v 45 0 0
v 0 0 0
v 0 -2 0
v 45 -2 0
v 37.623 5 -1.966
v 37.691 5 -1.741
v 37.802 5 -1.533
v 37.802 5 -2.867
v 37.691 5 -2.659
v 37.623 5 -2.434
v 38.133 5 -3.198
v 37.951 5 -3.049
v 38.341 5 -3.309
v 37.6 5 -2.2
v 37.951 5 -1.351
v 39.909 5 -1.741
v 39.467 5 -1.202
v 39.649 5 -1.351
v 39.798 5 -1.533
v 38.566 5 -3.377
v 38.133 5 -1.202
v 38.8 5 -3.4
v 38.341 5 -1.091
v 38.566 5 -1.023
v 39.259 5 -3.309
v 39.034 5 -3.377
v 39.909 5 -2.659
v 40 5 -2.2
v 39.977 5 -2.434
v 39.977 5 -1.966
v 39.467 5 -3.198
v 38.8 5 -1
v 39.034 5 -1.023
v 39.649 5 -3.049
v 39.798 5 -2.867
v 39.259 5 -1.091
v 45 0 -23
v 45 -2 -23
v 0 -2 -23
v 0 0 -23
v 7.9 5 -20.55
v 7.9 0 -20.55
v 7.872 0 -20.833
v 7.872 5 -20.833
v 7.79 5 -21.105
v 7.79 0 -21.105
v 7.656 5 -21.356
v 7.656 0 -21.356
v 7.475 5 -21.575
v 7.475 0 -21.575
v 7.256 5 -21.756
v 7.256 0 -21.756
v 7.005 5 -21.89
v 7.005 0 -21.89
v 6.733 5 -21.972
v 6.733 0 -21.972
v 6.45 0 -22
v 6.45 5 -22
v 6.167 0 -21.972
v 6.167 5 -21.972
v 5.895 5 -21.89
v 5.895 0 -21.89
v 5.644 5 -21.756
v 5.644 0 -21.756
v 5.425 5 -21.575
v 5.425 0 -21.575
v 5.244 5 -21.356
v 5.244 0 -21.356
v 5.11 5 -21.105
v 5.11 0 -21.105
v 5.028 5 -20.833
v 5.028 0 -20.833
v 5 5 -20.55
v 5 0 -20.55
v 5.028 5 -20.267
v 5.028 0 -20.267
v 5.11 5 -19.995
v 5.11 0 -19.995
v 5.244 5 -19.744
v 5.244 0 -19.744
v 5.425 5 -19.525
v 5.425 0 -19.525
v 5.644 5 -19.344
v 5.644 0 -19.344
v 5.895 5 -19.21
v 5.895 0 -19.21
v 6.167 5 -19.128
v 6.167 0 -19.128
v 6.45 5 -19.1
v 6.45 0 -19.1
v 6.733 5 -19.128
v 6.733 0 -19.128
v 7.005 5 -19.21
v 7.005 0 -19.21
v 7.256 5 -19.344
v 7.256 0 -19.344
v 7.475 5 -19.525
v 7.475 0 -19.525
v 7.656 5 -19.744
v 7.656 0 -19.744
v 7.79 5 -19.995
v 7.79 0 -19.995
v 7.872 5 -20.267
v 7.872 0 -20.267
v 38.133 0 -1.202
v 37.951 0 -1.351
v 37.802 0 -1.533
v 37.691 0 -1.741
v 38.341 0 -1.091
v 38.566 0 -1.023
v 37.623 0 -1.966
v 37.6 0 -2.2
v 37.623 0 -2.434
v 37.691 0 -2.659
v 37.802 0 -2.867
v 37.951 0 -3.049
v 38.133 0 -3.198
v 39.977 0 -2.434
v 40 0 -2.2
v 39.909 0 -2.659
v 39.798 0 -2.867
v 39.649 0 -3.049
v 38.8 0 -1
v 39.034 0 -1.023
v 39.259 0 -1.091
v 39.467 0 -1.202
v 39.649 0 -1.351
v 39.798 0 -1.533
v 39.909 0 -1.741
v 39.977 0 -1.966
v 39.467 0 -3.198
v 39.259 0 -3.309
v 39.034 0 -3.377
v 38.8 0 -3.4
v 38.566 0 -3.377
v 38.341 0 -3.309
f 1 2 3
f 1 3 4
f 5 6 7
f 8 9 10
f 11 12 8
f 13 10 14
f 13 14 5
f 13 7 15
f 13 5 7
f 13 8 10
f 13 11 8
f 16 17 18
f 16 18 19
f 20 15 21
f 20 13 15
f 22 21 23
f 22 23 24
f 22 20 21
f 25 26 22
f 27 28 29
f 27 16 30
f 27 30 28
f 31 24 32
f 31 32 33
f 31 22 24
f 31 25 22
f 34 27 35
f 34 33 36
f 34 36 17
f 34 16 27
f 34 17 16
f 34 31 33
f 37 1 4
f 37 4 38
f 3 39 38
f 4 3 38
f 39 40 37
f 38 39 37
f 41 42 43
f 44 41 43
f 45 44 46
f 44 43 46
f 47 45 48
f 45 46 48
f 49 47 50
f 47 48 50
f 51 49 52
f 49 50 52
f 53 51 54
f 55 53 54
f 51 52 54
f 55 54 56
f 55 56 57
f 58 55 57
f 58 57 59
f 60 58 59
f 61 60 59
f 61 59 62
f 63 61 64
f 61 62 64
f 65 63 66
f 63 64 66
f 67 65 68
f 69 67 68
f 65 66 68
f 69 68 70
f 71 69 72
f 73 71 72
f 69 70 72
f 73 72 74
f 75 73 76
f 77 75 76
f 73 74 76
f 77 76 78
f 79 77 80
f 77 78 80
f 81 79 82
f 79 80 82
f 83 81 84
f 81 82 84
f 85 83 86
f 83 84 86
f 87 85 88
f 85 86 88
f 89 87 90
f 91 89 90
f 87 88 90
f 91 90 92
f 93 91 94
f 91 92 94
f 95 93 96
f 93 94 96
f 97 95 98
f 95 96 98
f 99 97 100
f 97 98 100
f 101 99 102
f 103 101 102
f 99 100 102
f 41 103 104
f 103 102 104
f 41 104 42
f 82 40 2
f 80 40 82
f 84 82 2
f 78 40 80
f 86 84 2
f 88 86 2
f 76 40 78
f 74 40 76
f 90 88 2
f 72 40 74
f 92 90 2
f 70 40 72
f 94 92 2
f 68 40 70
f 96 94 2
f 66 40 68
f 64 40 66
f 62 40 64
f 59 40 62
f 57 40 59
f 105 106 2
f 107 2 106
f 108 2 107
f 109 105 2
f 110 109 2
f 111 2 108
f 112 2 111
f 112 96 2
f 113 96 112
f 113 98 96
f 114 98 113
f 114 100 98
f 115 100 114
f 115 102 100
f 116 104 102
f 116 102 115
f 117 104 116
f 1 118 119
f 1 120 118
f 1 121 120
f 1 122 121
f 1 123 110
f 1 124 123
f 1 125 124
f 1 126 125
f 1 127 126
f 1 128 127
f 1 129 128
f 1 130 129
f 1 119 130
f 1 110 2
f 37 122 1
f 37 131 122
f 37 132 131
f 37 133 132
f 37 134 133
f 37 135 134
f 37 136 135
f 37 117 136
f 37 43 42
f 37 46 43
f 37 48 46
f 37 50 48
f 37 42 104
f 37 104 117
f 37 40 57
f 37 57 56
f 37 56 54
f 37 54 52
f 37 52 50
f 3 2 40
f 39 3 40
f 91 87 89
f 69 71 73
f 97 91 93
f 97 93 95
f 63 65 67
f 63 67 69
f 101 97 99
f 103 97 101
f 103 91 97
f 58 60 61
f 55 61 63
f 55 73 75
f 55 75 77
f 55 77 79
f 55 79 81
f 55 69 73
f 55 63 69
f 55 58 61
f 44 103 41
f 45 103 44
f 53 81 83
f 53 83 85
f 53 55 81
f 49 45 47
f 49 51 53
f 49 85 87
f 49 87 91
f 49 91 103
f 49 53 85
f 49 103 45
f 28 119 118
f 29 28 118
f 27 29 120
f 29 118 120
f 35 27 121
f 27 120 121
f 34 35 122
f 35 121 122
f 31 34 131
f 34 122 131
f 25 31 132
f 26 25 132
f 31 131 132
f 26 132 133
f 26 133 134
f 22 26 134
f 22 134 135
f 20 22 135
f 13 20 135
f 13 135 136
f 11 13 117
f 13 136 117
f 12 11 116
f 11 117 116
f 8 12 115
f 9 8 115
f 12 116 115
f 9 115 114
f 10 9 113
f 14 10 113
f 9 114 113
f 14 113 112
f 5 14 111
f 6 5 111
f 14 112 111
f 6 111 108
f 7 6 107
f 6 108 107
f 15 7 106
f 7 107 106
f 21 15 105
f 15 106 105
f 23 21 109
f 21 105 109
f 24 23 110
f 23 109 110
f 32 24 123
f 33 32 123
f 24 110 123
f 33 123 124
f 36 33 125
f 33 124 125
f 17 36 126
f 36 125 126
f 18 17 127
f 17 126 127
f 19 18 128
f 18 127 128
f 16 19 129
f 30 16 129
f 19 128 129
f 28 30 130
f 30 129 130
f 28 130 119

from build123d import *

# Parameters (mm, degrees)
SKETCH1_W           = 45
SKETCH1_H           = 23
BOSS_EXTRUDE1_DEPTH = 2
SKETCH2_R           = 1.1999976
BOSS_EXTRUDE2_DEPTH = 5
SKETCH3_R           = 1.45
BOSS_EXTRUDE3_DEPTH = 5


with BuildPart() as part:
    # Sketch1 → Boss-Extrude1 (new body)
    with BuildSketch(Plane(origin=(0, 0, 0), x_dir=(1, 0, 0), z_dir=(0, 1, 0))):
        with Locations((22.5, 11.5)):
            Rectangle(SKETCH1_W, SKETCH1_H)
    extrude(amount=-BOSS_EXTRUDE1_DEPTH)

    # Sketch2 → Boss-Extrude2 (add)
    with BuildSketch(Plane(origin=(0, 0, 0), x_dir=(1, 0, 0), z_dir=(0, 1, 0))):
        with Locations((38.8, 2.2)):
            Circle(SKETCH2_R)
    extrude(amount=BOSS_EXTRUDE2_DEPTH)

    # Sketch3 → Boss-Extrude3 (add)
    with BuildSketch(Plane(origin=(0, 0, 0), x_dir=(1, 0, 0), z_dir=(0, 1, 0))):
        with Locations((6.45, 20.5499922)):
            Circle(SKETCH3_R)
    extrude(amount=BOSS_EXTRUDE3_DEPTH)


solid = part.part
